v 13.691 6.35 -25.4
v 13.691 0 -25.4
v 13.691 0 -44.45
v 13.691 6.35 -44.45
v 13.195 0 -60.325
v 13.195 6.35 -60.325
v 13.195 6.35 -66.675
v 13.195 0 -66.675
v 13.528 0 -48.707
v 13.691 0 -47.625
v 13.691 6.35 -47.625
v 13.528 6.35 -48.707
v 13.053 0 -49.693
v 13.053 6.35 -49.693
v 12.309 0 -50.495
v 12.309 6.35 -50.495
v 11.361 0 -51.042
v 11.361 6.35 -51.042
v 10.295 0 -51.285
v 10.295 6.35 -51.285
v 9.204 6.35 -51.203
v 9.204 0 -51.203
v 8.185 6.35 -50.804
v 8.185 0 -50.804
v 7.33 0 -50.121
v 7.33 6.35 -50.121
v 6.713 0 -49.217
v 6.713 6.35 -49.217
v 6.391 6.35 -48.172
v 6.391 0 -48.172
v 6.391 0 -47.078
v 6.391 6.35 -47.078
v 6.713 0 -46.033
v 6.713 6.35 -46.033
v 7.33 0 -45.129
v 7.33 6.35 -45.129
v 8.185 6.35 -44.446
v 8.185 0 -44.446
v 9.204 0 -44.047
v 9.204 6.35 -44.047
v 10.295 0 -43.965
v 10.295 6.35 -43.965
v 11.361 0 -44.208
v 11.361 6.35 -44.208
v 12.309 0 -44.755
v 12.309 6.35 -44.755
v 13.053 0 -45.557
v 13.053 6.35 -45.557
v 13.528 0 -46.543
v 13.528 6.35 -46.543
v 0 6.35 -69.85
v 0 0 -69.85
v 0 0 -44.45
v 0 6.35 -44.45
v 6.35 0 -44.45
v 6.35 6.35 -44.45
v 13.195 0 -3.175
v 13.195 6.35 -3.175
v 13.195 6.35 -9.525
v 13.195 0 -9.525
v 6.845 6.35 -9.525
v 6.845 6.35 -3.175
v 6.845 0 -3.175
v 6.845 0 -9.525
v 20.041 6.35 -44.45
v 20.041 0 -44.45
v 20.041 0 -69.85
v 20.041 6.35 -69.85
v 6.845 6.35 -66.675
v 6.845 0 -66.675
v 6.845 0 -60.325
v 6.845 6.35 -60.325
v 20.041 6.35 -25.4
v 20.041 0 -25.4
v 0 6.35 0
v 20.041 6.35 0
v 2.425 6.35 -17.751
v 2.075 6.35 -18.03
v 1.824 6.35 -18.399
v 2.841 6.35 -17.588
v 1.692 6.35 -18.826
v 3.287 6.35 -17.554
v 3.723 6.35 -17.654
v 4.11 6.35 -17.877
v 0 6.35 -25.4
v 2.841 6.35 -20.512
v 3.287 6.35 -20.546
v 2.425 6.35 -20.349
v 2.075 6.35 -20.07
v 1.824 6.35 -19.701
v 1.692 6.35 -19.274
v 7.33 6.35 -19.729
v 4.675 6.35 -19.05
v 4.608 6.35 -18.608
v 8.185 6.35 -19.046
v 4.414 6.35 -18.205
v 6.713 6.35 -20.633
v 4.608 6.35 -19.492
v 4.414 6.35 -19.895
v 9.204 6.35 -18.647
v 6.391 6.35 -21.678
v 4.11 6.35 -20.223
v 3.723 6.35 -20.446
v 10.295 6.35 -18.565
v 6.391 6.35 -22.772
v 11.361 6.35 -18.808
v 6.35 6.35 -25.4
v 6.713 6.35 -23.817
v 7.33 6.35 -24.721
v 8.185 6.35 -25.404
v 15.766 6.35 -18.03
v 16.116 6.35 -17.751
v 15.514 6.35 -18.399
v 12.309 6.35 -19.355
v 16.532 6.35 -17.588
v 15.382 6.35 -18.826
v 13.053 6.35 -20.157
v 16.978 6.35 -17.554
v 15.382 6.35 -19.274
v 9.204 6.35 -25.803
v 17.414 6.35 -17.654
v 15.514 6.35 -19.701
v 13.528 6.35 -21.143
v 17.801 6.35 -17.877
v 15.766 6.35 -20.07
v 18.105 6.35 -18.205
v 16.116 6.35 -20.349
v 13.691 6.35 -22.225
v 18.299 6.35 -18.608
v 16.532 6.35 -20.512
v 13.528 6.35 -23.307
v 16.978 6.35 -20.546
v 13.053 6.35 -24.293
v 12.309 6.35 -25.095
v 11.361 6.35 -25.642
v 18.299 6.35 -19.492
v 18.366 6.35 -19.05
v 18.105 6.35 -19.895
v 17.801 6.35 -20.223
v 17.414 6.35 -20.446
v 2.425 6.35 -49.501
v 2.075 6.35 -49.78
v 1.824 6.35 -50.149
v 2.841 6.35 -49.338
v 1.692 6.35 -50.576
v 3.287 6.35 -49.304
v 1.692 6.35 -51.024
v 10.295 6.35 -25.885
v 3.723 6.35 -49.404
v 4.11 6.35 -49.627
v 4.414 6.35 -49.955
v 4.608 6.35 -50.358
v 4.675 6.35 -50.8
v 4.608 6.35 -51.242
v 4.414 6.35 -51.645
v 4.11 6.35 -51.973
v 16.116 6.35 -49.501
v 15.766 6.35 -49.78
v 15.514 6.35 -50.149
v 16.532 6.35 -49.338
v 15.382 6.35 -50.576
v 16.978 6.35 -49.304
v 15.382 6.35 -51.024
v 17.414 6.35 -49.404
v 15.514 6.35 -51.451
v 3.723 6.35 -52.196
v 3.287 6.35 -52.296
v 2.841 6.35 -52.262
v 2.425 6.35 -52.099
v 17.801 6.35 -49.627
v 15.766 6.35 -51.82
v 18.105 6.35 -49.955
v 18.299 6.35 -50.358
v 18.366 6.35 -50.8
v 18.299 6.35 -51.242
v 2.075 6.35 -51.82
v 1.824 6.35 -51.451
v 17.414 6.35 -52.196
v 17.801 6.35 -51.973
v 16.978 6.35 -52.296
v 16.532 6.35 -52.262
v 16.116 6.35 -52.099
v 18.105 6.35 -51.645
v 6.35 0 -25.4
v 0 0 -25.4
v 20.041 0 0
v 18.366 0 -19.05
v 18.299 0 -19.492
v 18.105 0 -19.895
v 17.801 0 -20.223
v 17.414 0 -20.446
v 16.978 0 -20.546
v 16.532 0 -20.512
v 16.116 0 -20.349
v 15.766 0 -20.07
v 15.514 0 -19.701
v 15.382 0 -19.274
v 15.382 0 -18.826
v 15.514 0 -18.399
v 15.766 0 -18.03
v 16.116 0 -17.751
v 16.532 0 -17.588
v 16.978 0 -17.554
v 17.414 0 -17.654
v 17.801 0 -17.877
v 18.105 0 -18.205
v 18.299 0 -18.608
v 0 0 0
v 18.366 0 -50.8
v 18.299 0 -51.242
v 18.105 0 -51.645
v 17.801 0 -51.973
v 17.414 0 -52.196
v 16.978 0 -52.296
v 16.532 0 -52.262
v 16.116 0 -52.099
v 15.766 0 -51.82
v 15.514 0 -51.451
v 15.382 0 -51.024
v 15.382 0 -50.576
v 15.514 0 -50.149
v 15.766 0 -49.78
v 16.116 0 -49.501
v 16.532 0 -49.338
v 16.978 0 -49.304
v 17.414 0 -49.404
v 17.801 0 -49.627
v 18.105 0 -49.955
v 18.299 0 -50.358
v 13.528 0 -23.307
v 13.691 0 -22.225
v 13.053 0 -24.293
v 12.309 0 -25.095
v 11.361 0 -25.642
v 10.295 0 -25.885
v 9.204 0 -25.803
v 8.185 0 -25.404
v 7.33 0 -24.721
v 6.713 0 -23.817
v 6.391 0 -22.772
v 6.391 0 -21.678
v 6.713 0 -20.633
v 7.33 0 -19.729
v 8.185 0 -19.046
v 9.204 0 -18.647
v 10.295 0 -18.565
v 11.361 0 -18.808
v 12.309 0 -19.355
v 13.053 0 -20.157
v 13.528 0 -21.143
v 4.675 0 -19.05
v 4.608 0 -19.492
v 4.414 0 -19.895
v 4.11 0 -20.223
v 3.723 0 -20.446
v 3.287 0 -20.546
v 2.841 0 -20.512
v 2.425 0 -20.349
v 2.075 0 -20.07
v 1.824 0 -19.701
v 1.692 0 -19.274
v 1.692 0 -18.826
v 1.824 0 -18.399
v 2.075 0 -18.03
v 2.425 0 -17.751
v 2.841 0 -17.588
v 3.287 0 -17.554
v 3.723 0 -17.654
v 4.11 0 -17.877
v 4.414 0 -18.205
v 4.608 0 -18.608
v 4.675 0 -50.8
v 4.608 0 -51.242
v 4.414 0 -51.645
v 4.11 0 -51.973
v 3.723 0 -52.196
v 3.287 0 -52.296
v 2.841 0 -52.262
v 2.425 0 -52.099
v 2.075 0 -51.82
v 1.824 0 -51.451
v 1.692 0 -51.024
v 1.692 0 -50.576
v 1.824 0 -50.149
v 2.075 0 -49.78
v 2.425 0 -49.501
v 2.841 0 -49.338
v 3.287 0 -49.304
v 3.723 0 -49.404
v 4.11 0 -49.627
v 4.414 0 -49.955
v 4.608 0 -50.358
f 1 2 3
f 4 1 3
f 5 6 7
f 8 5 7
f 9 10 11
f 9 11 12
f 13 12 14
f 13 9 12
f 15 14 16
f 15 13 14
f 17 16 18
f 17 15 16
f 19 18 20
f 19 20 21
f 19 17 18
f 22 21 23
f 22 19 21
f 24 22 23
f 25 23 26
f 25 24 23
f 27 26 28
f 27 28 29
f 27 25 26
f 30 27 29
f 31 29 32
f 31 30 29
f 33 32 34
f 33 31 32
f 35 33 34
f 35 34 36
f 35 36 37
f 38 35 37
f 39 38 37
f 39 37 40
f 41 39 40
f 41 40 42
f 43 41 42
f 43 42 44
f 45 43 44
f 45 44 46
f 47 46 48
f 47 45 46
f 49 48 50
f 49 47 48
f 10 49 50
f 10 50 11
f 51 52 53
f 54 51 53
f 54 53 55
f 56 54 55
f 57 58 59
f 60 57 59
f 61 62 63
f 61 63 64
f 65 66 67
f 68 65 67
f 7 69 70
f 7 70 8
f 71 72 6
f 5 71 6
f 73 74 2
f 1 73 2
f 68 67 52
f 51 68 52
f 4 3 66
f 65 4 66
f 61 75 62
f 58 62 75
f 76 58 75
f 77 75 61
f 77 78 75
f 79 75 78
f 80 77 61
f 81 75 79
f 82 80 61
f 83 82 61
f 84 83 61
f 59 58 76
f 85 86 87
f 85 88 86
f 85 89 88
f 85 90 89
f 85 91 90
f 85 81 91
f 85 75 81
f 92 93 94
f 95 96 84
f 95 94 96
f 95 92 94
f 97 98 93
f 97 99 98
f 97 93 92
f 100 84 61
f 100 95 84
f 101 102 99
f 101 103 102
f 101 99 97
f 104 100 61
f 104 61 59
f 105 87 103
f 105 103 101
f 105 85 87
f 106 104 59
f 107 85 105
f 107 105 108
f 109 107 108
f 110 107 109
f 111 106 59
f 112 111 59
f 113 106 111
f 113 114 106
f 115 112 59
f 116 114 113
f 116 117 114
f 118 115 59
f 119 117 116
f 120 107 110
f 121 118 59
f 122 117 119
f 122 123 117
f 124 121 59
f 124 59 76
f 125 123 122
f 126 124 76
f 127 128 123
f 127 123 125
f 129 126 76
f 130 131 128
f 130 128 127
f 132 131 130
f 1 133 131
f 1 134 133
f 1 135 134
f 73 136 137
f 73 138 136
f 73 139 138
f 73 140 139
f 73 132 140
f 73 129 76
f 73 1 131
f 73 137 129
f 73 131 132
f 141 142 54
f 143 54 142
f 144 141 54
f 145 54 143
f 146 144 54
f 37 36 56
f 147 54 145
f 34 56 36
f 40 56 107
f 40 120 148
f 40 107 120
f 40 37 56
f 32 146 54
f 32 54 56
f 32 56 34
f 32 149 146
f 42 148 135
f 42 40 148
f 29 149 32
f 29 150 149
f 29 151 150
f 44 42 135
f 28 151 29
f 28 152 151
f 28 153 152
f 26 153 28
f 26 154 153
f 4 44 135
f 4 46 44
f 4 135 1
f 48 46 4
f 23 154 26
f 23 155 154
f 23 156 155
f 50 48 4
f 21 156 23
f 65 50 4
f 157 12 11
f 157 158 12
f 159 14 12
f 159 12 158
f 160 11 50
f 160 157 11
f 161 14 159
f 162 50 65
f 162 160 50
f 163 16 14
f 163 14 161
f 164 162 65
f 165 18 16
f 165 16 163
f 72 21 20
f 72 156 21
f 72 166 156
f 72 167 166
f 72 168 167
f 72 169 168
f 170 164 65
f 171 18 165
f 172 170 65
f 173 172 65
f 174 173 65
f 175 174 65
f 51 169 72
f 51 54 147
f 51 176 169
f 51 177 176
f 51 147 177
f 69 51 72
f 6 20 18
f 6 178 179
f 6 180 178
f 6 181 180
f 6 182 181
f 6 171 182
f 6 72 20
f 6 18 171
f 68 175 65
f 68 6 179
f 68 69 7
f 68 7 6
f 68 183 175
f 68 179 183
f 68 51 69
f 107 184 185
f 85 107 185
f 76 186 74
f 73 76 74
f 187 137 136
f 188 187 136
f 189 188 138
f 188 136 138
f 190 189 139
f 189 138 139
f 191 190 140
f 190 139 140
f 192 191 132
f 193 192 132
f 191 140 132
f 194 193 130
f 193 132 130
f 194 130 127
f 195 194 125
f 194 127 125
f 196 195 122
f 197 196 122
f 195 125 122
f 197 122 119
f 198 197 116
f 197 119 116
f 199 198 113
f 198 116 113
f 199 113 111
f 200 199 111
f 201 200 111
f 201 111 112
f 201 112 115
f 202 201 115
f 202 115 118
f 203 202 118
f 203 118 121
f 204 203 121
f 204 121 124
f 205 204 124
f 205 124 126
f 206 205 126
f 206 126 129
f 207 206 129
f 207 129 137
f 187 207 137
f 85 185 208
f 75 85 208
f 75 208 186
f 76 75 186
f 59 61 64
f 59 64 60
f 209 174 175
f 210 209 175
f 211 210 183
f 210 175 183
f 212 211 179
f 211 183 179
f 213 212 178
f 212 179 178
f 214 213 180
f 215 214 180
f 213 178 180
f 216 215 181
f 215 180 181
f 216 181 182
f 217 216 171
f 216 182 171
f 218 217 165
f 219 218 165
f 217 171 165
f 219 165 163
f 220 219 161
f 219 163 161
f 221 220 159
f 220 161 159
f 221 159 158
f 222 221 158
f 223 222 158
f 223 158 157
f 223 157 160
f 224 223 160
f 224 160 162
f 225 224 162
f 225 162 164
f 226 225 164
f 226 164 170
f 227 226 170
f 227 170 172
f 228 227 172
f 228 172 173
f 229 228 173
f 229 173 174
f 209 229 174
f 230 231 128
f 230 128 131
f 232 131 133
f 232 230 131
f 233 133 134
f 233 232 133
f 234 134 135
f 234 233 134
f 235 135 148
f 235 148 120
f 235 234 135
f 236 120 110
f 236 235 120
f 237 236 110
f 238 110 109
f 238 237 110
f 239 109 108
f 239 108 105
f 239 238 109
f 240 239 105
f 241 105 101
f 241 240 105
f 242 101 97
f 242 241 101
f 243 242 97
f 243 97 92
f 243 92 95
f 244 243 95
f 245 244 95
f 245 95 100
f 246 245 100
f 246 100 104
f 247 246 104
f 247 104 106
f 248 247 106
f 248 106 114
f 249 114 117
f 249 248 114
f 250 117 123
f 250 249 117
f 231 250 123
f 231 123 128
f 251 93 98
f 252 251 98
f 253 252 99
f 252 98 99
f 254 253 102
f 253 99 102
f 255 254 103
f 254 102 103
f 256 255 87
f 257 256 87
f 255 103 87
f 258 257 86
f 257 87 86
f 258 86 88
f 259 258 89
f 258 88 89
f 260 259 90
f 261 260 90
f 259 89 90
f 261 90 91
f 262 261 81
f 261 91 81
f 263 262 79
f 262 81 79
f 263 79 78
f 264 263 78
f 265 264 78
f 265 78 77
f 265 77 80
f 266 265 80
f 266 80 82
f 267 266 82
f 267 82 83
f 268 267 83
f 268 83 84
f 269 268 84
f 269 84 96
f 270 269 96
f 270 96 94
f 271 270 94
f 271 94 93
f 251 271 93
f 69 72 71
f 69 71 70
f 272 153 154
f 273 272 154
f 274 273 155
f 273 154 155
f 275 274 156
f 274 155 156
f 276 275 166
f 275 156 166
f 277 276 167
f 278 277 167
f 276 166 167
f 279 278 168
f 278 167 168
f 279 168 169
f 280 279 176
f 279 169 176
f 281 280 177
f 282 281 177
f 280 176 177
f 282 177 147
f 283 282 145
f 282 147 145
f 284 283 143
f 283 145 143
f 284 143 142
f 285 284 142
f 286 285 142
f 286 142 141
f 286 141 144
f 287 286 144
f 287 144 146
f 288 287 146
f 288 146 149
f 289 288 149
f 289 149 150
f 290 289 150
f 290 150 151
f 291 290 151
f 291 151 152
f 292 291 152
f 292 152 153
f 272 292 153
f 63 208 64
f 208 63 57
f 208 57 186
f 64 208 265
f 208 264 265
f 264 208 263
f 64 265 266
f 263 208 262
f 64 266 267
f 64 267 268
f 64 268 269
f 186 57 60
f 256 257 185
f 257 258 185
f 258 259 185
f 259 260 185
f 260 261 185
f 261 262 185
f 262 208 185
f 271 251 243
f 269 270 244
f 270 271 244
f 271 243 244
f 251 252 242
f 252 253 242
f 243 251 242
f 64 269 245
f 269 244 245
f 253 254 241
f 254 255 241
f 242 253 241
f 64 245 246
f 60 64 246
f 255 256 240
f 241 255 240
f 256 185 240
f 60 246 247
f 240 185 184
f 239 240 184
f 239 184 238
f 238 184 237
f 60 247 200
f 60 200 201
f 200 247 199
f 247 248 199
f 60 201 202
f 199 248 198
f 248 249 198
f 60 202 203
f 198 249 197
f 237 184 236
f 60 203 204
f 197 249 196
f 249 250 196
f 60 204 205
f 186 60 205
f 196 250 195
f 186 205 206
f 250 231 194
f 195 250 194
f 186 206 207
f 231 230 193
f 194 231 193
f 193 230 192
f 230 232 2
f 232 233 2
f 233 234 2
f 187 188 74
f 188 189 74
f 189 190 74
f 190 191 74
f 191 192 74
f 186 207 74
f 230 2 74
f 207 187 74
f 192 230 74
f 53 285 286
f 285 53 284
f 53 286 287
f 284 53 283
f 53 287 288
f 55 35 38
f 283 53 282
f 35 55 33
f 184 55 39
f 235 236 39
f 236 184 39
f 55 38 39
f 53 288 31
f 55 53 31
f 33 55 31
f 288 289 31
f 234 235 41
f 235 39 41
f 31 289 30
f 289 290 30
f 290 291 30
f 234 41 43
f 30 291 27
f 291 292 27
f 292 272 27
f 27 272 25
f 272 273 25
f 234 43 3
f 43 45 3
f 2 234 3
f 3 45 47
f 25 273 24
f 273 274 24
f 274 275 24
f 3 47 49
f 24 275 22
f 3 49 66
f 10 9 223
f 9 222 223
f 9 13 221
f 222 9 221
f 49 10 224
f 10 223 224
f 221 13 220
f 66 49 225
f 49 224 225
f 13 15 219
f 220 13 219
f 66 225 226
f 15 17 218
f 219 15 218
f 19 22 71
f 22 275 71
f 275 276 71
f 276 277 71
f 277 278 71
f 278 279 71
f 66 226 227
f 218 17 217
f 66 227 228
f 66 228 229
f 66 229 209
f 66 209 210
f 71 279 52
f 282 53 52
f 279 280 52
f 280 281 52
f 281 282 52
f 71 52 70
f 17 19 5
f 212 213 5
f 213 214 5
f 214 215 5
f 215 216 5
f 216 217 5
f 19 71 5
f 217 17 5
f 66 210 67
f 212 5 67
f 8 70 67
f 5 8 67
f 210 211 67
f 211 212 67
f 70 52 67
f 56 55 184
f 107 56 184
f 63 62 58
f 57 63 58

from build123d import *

# Parameters (mm, degrees)
SKETCH1_W           = 6.35
SKETCH1_H           = 6.35
SKETCH1_R           = 3.6703
BOSS_EXTRUDE1_DEPTH = 6.35
SKETCH2_R           = 1.5
CUT_EXTRUDE1_DEPTH  = 7.35


with BuildPart() as part:
    # Sketch1 → Boss-Extrude1 (new body)
    with BuildSketch(Plane(origin=(0, 0, 0), x_dir=(1, 0, 0), z_dir=(0, 1, 0))):
        Polygon((0, 25.4), (0, 0), (20.0406, 0), (20.0406, 25.4), (13.6906, 25.4), (13.6906, 44.45), (20.0406, 44.45), (20.0406, 69.85), (0, 69.85), (0, 44.45), (6.35, 44.45), (6.35, 25.4), align=None)
        with Locations((10.0203, 6.35)):
            Rectangle(SKETCH1_W, SKETCH1_H, mode=Mode.SUBTRACT)
        with Locations((10.0203, 22.225)):
            Circle(SKETCH1_R, mode=Mode.SUBTRACT)
        with Locations((10.0203, 63.5)):
            Rectangle(SKETCH1_W, SKETCH1_H, mode=Mode.SUBTRACT)
        with Locations((10.0203, 47.625)):
            Circle(SKETCH1_R, mode=Mode.SUBTRACT)
    extrude(amount=BOSS_EXTRUDE1_DEPTH)

    # Sketch2 → Cut-Extrude1 (cut, through all)
    with BuildSketch(Plane(origin=(0, 6.35, 0), x_dir=(1, 0, 0), z_dir=(0, 1, 0))):
        with Locations((3.175, 50.8)):
            Circle(SKETCH2_R)
        with Locations((3.175, 19.05)):
            Circle(SKETCH2_R)
        with Locations((16.8656, 19.05)):
            Circle(SKETCH2_R)
        with Locations((16.8656, 50.8)):
            Circle(SKETCH2_R)
    extrude(amount=-CUT_EXTRUDE1_DEPTH, mode=Mode.SUBTRACT)


solid = part.part
